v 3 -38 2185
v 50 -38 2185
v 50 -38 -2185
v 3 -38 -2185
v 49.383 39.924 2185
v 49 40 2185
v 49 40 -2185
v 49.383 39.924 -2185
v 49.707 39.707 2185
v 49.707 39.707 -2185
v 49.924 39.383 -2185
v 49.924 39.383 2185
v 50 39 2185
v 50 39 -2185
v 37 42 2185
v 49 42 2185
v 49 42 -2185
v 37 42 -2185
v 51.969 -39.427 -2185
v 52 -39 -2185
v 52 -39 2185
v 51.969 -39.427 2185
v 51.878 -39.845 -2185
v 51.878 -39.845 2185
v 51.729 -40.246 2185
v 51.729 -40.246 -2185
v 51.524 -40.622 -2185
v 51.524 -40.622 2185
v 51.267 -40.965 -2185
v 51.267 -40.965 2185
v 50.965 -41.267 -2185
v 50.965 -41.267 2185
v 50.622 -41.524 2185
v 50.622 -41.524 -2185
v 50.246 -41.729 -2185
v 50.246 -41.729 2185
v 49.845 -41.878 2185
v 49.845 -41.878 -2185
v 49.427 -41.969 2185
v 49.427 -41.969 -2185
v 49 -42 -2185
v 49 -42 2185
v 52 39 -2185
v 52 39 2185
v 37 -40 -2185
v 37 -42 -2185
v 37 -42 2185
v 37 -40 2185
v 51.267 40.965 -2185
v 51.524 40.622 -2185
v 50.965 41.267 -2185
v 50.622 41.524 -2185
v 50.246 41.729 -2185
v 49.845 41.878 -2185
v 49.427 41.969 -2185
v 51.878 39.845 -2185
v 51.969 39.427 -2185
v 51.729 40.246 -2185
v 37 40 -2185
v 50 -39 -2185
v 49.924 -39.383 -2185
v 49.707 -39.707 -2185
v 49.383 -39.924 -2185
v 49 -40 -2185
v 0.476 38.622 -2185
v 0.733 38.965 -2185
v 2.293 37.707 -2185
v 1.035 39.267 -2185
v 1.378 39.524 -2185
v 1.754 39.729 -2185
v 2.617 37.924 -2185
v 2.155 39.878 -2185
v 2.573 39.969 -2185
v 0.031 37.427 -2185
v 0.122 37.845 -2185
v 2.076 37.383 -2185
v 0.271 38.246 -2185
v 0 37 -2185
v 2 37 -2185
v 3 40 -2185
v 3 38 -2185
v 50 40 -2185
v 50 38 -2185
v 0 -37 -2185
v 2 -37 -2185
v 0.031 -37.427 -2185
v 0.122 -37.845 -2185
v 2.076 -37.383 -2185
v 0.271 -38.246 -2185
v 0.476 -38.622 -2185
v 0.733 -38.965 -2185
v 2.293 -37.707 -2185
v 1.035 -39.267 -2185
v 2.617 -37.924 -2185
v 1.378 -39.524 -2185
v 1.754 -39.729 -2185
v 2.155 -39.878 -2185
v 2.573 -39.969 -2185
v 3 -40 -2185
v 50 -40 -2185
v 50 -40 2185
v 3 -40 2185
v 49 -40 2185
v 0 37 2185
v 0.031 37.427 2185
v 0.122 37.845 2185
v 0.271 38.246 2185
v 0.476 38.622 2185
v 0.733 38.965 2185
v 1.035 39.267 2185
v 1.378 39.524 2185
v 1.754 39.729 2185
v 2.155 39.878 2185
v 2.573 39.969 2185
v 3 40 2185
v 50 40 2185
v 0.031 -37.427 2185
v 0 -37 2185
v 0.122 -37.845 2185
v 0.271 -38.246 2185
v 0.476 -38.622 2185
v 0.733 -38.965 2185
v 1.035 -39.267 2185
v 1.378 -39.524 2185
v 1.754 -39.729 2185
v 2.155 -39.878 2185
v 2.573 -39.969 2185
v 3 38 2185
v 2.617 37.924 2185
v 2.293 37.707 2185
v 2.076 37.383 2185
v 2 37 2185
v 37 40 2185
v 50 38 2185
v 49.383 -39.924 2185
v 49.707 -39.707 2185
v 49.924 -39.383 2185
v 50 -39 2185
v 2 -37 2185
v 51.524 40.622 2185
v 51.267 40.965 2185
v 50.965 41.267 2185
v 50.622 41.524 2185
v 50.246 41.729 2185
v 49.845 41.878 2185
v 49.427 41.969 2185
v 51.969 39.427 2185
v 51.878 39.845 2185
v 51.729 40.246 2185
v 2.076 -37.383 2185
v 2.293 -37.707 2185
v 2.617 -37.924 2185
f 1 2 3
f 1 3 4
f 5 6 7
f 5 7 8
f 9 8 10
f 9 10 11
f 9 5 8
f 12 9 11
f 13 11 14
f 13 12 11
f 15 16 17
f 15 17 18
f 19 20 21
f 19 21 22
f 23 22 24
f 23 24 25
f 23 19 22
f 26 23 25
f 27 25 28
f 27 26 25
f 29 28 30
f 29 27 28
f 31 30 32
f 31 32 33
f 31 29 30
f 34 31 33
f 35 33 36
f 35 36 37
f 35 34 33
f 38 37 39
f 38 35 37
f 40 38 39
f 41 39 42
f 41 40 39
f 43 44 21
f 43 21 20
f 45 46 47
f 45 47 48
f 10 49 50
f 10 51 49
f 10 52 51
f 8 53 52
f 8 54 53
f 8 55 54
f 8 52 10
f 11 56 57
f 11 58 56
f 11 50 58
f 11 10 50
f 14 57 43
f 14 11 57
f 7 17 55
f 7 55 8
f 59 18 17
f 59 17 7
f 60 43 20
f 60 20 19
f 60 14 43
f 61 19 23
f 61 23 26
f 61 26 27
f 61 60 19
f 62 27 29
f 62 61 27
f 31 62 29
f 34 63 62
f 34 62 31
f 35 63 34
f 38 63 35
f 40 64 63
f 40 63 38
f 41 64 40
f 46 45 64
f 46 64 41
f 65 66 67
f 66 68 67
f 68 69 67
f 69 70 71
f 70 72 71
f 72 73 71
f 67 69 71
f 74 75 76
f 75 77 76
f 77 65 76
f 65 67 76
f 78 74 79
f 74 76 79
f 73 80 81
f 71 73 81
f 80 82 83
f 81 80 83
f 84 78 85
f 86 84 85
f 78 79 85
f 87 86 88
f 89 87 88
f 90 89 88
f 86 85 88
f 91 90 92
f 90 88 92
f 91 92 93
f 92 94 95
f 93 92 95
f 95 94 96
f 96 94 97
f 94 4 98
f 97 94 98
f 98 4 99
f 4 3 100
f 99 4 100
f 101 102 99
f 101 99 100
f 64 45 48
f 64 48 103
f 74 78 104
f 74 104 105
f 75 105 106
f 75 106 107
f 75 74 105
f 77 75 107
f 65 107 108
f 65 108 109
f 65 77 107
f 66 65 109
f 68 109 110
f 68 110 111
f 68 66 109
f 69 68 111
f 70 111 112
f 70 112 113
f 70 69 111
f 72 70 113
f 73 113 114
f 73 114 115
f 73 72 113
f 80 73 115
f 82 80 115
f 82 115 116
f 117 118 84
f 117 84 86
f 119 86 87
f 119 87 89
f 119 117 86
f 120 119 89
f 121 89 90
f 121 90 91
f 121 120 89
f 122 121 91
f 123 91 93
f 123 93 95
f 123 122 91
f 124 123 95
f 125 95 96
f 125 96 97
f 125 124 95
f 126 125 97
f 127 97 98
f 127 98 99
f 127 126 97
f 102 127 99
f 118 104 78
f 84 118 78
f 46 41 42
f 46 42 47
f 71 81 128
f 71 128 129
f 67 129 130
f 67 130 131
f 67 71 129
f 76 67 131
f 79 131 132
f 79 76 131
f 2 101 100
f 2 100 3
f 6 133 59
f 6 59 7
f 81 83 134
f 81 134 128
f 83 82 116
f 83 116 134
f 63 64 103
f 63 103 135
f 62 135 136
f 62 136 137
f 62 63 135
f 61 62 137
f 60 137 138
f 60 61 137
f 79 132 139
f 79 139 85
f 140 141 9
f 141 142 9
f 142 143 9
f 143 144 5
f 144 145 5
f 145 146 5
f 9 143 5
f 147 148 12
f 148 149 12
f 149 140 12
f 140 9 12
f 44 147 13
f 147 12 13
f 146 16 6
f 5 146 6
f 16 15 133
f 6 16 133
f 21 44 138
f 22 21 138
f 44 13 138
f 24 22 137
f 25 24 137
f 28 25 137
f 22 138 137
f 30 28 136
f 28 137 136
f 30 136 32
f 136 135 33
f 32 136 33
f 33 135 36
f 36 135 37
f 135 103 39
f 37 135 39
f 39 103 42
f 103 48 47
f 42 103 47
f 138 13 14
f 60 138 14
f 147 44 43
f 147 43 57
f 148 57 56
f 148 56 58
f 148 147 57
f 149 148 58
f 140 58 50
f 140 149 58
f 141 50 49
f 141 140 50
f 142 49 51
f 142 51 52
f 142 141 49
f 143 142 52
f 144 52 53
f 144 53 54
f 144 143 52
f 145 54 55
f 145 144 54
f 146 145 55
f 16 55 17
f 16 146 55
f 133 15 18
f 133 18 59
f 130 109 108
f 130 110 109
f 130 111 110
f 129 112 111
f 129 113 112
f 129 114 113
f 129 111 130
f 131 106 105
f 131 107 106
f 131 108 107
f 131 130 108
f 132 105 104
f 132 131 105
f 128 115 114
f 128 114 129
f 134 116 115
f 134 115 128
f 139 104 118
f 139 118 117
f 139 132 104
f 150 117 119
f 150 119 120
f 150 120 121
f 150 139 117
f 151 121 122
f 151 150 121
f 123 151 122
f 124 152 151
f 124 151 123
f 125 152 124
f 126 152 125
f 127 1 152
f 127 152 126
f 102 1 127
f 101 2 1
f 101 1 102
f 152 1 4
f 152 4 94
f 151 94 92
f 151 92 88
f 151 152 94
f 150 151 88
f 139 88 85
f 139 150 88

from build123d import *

# Parameters (mm, degrees)
SKETCH1_W                      = 4370
SKETCH1_H                      = 80
BASE_FLANGE1_DEPTH             = 2
EDGE_FLANGE1_STRIP_W           = 10
EDGE_FLANGE1_STRIP_H           = 2
EDGE_FLANGE1_STRIP_CUT_DEPTH   = 4370
EDGE_FLANGE1_STRIP_2_W         = 10
EDGE_FLANGE1_STRIP_2_H         = 2
EDGE_FLANGE1_STRIP_CUT_2_DEPTH = 4370
EDGE_FLANGE1_DEPTH             = 4370
EDGE_FLANGE1_BEND_DEPTH        = 4370
SKETCH13_W                     = 4370
SKETCH13_H                     = 80
BASE_FLANGE2_DEPTH             = 2
EDGE_FLANGE2_STRIP_W           = 10
EDGE_FLANGE2_STRIP_H           = 2
EDGE_FLANGE2_STRIP_CUT_DEPTH   = 4370
EDGE_FLANGE2_STRIP_2_W         = 10
EDGE_FLANGE2_STRIP_2_H         = 2
EDGE_FLANGE2_STRIP_CUT_2_DEPTH = 4370
EDGE_FLANGE2_DEPTH             = 4370
EDGE_FLANGE2_BEND_DEPTH        = 4370


# Sheet-metal steps are written as plain solids
with BuildPart() as part:
    # Sketch1 → Base-Flange1 (new body)
    with BuildSketch(Plane(origin=(0, 0, 0), x_dir=(0, 0, -1), z_dir=(1, 0, 0))):
        Rectangle(SKETCH1_W, SKETCH1_H)
    extrude(amount=BASE_FLANGE1_DEPTH)

    # Edge-Flange1 strip (across the edge) → Edge-Flange1 strip cut (cut)
    with BuildSketch(Plane(origin=(2, 40, -2185), x_dir=(0, -1, 0), z_dir=(0, 0, 1))):
        with Locations((-2, -1)):
            Rectangle(EDGE_FLANGE1_STRIP_W, EDGE_FLANGE1_STRIP_H)
    extrude(amount=EDGE_FLANGE1_STRIP_CUT_DEPTH, mode=Mode.SUBTRACT)

    # Edge-Flange1 strip 2 (across the edge) → Edge-Flange1 strip cut 2 (cut)
    with BuildSketch(Plane(origin=(2, -40, 2185), x_dir=(0, 1, 0), z_dir=(0, 0, -1))):
        with Locations((-2, -1)):
            Rectangle(EDGE_FLANGE1_STRIP_2_W, EDGE_FLANGE1_STRIP_2_H)
    extrude(amount=EDGE_FLANGE1_STRIP_CUT_2_DEPTH, mode=Mode.SUBTRACT)

    # Edge-Flange1 section (across the edge) → Edge-Flange1 (add)
    with BuildSketch(Plane(origin=(2, 40, -2185), x_dir=(0, -1, 0), z_dir=(0, 0, 1))):
        with BuildLine():
            Line((0, 1), (0, 48))
            Line((0, 48), (2, 48))
            Line((2, 48), (2, 1))
            ThreePointArc((2, 1), (2.292893219, 0.292893219), (3, 0))
            Line((3, 0), (3, -2))
            ThreePointArc((3, -2), (0.878679656, -1.121320344), (0, 1))
        make_face()
    extrude(amount=EDGE_FLANGE1_DEPTH)

    # Edge-Flange1 section 2 (across the edge) → Edge-Flange1 bend (add)
    with BuildSketch(Plane(origin=(2, -40, 2185), x_dir=(0, 1, 0), z_dir=(0, 0, -1))):
        with BuildLine():
            Line((0, 1), (0, 48))
            Line((0, 48), (2, 48))
            Line((2, 48), (2, 1))
            ThreePointArc((2, 1), (2.292893219, 0.292893219), (3, 0))
            Line((3, 0), (3, -2))
            ThreePointArc((3, -2), (0.878679656, -1.121320344), (0, 1))
        make_face()
    extrude(amount=EDGE_FLANGE1_BEND_DEPTH)


with BuildPart() as body_2:
    # Sketch13 → Base-Flange2 (new body)
    with BuildSketch(Plane(origin=(50, 0, 0), x_dir=(0, 0, -1), z_dir=(1, 0, 0))):
        Rectangle(SKETCH13_W, SKETCH13_H)
    extrude(amount=BASE_FLANGE2_DEPTH)

    # Edge-Flange2 strip (across the edge) → Edge-Flange2 strip cut (cut)
    with BuildSketch(Plane(origin=(50, 40, 2185), x_dir=(0, -1, 0), z_dir=(0, 0, -1))):
        with Locations((-4, -1)):
            Rectangle(EDGE_FLANGE2_STRIP_W, EDGE_FLANGE2_STRIP_H)
    extrude(amount=EDGE_FLANGE2_STRIP_CUT_DEPTH, mode=Mode.SUBTRACT)

    # Edge-Flange2 strip 2 (across the edge) → Edge-Flange2 strip cut 2 (cut)
    with BuildSketch(Plane(origin=(50, -40, -2185), x_dir=(0, 1, 0), z_dir=(0, 0, 1))):
        with Locations((-4, -1)):
            Rectangle(EDGE_FLANGE2_STRIP_2_W, EDGE_FLANGE2_STRIP_2_H)
    extrude(amount=EDGE_FLANGE2_STRIP_CUT_2_DEPTH, mode=Mode.SUBTRACT)

    # Edge-Flange2 section (across the edge) → Edge-Flange2 (add)
    with BuildSketch(Plane(origin=(50, 40, 2185), x_dir=(0, -1, 0), z_dir=(0, 0, -1))):
        with BuildLine():
            Line((-2, 1), (-2, 13))
            Line((-2, 13), (0, 13))
            Line((0, 13), (0, 1))
            ThreePointArc((0, 1), (0.292893219, 0.292893219), (1, 0))
            Line((1, 0), (1, -2))
            ThreePointArc((1, -2), (-1.121320344, -1.121320344), (-2, 1))
        make_face()
    extrude(amount=EDGE_FLANGE2_DEPTH)

    # Edge-Flange2 section 2 (across the edge) → Edge-Flange2 bend (add)
    with BuildSketch(Plane(origin=(50, -40, -2185), x_dir=(0, 1, 0), z_dir=(0, 0, 1))):
        with BuildLine():
            Line((-2, 1), (-2, 13))
            Line((-2, 13), (0, 13))
            Line((0, 13), (0, 1))
            ThreePointArc((0, 1), (0.292893219, 0.292893219), (1, 0))
            Line((1, 0), (1, -2))
            ThreePointArc((1, -2), (-1.121320344, -1.121320344), (-2, 1))
        make_face()
    extrude(amount=EDGE_FLANGE2_BEND_DEPTH)


solid = Compound([part.part, body_2.part])
